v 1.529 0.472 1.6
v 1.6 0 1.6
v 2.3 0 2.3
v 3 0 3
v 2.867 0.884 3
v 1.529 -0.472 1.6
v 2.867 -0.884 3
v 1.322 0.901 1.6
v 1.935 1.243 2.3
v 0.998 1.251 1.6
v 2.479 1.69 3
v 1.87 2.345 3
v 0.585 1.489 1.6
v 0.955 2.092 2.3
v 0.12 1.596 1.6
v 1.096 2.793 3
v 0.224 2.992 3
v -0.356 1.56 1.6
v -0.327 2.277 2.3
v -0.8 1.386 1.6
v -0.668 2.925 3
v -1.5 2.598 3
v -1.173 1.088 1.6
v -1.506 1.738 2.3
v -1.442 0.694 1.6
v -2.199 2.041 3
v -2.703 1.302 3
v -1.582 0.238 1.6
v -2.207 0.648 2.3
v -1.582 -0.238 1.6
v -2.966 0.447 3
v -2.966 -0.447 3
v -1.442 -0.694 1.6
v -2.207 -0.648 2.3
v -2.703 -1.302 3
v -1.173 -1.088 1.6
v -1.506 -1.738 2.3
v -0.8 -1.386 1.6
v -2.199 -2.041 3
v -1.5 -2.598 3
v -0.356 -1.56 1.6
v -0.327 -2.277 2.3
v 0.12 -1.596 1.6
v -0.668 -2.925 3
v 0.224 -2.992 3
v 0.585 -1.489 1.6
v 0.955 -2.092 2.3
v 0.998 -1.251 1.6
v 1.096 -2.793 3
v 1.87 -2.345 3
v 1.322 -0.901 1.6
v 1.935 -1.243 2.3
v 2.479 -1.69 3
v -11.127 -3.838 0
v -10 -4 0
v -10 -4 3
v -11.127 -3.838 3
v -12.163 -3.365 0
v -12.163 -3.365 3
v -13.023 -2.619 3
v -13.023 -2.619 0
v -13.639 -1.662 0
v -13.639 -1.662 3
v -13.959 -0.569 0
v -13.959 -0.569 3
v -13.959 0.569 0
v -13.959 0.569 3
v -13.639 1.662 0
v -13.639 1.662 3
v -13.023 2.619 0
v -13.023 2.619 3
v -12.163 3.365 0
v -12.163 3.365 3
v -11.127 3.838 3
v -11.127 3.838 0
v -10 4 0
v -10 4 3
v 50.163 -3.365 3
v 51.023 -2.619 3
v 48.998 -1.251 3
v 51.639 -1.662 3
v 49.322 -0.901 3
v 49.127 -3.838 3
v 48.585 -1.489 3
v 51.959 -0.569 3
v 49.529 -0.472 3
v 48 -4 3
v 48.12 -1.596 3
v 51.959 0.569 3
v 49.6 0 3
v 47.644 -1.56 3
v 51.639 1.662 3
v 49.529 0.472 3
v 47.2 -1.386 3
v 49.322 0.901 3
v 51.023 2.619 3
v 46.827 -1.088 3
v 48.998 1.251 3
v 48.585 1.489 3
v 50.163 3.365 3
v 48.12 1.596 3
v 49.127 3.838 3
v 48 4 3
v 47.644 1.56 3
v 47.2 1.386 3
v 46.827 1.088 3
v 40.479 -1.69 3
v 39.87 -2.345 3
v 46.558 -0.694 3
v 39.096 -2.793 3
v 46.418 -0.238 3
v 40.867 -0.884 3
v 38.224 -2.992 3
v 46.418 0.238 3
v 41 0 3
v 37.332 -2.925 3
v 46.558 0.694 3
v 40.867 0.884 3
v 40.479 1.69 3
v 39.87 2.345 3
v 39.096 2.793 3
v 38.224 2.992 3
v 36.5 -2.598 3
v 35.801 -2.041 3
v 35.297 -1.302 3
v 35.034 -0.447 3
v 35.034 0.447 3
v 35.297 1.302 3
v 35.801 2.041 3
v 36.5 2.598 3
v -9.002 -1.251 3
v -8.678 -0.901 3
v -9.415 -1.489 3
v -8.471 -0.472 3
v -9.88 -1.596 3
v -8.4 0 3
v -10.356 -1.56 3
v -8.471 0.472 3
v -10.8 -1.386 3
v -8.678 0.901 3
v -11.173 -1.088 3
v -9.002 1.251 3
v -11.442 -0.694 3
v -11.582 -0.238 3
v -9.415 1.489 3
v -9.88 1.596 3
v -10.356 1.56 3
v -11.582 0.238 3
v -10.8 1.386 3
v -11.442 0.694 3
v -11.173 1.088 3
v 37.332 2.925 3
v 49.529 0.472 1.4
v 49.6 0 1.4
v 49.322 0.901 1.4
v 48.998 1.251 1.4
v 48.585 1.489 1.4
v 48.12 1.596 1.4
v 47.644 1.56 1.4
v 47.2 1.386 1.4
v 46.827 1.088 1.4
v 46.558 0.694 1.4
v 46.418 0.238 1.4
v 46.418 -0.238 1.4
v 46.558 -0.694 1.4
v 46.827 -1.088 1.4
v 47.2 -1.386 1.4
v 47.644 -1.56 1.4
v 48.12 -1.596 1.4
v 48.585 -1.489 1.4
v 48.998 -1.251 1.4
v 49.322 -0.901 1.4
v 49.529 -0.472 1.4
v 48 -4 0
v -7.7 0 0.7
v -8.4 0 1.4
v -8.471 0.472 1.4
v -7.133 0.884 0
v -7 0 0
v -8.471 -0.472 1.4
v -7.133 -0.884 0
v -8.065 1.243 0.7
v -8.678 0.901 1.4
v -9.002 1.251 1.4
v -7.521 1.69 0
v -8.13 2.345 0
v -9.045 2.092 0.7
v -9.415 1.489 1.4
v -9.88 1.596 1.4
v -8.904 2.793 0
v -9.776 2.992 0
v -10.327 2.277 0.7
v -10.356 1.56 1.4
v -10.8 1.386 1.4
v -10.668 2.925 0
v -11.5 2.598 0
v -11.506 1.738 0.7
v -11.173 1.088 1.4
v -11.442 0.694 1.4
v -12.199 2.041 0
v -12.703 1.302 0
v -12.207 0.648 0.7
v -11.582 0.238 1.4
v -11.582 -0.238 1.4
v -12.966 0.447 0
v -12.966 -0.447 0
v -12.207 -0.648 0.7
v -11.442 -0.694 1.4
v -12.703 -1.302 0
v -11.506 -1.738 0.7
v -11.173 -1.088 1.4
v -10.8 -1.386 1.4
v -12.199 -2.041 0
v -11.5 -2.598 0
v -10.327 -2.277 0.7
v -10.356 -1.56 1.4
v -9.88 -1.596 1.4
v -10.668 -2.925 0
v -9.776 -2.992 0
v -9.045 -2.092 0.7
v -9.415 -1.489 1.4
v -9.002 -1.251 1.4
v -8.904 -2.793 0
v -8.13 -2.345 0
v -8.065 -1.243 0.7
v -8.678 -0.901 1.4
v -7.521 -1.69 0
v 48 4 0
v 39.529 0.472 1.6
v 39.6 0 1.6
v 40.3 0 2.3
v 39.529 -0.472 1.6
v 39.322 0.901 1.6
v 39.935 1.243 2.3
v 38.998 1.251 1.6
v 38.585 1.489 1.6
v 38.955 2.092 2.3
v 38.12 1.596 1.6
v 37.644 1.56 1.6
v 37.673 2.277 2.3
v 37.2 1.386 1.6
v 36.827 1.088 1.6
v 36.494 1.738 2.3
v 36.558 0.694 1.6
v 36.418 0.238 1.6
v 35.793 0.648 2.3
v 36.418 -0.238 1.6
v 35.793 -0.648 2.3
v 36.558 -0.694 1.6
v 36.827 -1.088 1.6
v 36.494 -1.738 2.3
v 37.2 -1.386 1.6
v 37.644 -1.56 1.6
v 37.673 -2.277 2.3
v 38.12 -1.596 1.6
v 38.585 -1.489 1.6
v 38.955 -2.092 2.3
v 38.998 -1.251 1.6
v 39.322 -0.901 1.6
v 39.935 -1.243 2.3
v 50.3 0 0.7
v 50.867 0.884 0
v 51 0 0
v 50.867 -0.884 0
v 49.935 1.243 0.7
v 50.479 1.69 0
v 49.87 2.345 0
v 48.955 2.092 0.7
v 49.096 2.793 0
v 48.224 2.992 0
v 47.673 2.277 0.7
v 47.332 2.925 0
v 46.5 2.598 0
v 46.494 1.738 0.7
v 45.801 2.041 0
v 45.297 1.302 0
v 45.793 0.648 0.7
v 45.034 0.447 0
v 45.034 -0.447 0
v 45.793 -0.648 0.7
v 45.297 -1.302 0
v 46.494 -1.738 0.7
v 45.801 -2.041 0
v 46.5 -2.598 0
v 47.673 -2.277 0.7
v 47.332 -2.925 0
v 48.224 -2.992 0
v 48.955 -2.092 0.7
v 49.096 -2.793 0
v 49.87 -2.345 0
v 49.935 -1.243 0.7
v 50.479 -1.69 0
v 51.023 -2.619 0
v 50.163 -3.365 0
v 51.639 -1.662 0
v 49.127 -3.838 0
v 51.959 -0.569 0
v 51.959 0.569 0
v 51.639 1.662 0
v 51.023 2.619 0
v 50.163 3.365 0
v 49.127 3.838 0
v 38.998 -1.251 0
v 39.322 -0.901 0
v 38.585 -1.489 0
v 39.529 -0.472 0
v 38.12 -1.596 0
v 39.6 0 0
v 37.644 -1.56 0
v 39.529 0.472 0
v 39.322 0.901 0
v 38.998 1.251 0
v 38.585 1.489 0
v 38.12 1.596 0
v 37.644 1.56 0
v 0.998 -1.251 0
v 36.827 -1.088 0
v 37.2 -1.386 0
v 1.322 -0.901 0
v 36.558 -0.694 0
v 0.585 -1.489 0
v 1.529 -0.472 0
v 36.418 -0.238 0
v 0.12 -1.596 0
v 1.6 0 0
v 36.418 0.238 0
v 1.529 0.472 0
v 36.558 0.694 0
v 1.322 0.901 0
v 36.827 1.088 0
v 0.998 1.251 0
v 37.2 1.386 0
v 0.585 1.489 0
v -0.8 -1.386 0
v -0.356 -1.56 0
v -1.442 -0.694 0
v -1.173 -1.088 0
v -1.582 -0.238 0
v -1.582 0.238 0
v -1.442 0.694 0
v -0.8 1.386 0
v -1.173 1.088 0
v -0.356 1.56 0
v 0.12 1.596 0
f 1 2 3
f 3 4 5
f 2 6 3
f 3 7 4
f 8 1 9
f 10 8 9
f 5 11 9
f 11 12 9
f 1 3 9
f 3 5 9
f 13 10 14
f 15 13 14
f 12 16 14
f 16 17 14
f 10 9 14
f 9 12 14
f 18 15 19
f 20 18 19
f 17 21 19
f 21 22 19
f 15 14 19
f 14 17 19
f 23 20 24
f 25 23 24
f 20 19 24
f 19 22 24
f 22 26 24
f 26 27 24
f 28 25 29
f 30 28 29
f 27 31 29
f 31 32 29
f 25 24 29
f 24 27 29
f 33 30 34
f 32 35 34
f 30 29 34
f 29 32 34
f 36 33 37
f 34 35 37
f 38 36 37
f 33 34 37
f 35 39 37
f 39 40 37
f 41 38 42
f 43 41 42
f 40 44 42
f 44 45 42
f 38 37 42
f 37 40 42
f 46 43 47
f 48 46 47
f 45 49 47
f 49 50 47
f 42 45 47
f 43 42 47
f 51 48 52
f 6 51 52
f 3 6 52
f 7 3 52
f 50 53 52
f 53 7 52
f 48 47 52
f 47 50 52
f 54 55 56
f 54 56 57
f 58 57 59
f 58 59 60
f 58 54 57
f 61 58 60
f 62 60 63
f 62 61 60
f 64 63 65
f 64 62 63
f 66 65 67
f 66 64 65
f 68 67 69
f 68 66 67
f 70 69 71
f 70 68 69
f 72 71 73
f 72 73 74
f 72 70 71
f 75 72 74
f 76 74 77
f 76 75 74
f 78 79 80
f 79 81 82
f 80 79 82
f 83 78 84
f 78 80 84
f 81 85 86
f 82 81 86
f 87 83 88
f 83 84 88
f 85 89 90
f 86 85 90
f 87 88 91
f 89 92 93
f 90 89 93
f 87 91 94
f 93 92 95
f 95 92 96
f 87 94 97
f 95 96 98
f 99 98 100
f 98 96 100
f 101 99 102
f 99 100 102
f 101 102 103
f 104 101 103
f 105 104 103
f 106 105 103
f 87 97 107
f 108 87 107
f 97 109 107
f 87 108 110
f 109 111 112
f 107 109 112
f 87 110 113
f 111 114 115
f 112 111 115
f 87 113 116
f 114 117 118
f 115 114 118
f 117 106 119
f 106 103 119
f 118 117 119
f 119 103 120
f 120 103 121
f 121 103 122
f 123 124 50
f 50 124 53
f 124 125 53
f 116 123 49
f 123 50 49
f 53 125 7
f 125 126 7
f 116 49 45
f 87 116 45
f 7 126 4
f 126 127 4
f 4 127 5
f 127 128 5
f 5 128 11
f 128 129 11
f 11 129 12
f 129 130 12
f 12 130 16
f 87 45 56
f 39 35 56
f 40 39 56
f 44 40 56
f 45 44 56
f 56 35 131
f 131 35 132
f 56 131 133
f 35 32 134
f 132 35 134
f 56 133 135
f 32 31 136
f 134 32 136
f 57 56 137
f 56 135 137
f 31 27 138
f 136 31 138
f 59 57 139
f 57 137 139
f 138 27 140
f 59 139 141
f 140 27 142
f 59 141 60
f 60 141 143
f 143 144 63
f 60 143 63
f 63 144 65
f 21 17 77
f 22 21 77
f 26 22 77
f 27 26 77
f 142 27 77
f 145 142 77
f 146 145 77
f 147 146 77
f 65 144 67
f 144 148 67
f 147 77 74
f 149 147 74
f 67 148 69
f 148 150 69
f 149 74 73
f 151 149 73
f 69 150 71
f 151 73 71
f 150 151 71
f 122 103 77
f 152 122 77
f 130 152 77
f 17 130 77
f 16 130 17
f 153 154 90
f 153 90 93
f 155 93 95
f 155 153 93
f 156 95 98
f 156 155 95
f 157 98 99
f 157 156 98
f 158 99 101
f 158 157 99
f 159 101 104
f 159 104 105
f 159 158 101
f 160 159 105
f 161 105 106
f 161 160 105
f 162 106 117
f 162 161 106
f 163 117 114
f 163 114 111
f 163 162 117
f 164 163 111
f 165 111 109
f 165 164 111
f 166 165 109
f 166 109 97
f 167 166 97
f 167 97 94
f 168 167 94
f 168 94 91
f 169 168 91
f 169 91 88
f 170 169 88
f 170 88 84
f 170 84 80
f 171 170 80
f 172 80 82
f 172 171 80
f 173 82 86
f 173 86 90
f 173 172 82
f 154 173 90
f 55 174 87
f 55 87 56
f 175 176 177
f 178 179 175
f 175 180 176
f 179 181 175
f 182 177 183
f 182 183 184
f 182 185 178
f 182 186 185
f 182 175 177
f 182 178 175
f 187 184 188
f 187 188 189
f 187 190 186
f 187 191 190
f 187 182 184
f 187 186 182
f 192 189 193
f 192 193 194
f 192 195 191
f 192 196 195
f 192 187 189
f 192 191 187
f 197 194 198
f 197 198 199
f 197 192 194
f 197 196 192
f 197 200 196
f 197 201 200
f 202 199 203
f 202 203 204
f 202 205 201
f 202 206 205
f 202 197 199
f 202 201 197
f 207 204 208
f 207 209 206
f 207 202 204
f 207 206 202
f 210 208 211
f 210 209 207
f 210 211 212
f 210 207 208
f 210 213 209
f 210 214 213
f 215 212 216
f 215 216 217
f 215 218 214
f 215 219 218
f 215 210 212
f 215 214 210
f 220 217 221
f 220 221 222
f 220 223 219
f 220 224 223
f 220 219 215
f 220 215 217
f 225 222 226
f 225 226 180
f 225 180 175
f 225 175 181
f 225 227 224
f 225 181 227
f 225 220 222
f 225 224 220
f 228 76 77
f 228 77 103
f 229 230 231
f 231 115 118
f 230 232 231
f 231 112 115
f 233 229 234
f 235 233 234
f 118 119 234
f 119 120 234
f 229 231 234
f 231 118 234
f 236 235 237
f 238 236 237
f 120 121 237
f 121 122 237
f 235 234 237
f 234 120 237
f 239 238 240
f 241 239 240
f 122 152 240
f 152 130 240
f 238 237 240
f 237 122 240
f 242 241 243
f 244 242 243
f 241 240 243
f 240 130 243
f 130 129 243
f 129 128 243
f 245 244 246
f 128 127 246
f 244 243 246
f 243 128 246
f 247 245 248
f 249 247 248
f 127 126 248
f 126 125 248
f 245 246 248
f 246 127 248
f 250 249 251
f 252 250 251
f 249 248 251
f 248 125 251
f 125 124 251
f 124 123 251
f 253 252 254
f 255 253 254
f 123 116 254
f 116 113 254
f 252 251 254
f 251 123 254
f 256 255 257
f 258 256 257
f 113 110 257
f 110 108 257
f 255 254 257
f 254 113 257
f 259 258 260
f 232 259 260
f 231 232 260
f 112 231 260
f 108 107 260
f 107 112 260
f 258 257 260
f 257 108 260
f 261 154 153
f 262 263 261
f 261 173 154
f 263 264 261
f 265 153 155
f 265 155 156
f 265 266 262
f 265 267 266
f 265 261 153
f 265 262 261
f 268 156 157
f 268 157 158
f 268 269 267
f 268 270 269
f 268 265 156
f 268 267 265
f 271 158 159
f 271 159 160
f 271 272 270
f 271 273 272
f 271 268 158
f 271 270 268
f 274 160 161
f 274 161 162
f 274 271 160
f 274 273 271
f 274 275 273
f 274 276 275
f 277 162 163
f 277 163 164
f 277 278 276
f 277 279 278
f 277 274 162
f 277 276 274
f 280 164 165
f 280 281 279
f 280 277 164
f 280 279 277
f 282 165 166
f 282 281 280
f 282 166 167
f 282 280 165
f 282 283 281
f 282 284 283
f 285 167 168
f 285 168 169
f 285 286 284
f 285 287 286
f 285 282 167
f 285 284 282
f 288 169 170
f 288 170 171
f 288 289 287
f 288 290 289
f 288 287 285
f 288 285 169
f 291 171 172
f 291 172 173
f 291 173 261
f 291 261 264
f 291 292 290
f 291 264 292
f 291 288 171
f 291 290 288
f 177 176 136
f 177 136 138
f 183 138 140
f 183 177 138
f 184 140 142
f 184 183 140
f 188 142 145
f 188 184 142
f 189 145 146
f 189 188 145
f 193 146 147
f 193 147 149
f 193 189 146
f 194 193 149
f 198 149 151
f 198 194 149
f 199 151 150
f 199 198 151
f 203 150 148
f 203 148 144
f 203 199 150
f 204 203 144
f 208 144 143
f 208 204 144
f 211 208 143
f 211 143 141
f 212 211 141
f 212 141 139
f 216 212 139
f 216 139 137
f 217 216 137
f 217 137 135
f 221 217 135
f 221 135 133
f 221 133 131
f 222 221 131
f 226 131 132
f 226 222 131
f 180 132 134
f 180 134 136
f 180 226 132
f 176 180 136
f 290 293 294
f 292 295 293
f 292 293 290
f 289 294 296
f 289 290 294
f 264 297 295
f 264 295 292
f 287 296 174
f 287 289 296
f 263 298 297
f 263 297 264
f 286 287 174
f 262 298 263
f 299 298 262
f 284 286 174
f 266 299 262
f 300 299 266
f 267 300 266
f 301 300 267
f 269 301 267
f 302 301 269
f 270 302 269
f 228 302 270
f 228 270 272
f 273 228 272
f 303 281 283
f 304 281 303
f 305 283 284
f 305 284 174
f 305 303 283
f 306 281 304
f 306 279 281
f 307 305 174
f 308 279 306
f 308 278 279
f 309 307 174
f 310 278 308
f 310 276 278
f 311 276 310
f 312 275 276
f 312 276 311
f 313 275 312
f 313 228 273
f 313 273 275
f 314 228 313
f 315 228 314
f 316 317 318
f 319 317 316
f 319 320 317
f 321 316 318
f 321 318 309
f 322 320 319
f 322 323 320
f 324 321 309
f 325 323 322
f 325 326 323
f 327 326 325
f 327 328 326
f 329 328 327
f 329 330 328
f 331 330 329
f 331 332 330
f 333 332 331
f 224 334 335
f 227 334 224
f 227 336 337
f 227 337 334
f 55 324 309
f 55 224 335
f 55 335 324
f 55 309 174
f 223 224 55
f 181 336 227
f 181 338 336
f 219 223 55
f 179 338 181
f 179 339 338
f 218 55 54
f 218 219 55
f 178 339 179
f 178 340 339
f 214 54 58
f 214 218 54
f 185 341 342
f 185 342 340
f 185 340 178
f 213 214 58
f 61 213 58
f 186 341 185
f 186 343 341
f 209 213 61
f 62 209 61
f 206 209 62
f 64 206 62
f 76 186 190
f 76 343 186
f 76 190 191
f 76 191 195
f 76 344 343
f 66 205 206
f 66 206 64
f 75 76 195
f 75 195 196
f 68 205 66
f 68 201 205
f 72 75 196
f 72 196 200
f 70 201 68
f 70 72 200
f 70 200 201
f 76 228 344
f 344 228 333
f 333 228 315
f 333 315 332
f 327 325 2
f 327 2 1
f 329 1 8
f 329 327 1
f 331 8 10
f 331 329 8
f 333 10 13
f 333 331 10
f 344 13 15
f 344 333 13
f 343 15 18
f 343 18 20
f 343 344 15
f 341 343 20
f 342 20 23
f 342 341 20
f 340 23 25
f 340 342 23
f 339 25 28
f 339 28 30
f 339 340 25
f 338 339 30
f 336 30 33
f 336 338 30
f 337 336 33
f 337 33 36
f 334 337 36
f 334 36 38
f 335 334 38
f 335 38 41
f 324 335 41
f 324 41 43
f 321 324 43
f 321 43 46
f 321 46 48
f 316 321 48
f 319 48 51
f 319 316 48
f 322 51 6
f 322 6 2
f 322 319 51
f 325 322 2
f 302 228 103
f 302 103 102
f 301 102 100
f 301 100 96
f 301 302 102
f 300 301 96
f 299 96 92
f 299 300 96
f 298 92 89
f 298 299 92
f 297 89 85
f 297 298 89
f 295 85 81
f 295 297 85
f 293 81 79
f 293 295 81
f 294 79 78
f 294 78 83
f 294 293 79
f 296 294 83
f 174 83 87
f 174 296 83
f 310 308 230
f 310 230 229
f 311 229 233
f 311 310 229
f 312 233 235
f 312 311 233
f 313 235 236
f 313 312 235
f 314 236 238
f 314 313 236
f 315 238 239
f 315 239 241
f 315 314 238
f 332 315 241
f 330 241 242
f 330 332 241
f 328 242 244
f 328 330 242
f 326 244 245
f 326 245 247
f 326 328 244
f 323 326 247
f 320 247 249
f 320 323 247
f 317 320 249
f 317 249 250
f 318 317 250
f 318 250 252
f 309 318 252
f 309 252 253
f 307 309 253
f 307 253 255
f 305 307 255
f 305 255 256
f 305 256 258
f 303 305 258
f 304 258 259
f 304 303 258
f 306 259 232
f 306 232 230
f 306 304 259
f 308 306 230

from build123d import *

# Parameters (mm, degrees)
SKETCH_1_R      = 1.6
EXTRUDE_1_DEPTH = 3
CHAMFER_1_SIZE  = 1.4


with BuildPart() as part:
    # 草图1 → 凸台-拉伸1 (new body)
    with BuildSketch(Plane.XY):
        with BuildLine():
            Line((-10, 4), (48, 4))
            ThreePointArc((48, 4), (52, 0), (48, -4))
            Line((48, -4), (-10, -4))
            ThreePointArc((-10, -4), (-14, 0), (-10, 4))
        make_face()
        Circle(SKETCH_1_R, mode=Mode.SUBTRACT)
        with Locations((38, 0)):
            Circle(SKETCH_1_R, mode=Mode.SUBTRACT)
        with Locations((-10, 0)):
            Circle(SKETCH_1_R, mode=Mode.SUBTRACT)
        with Locations((48, 0)):
            Circle(SKETCH_1_R, mode=Mode.SUBTRACT)
    extrude(amount=EXTRUDE_1_DEPTH)

    # 倒角1
    chamfer_1_edges = [part.edges().sort_by_distance(p)[0] for p in [
        (-1.6, 0, 3),
        (-11.6, 0, 0),
        (46.4, 0, 0),
        (36.4, 0, 3),
    ]]
    chamfer(chamfer_1_edges, length=CHAMFER_1_SIZE)


solid = part.part
